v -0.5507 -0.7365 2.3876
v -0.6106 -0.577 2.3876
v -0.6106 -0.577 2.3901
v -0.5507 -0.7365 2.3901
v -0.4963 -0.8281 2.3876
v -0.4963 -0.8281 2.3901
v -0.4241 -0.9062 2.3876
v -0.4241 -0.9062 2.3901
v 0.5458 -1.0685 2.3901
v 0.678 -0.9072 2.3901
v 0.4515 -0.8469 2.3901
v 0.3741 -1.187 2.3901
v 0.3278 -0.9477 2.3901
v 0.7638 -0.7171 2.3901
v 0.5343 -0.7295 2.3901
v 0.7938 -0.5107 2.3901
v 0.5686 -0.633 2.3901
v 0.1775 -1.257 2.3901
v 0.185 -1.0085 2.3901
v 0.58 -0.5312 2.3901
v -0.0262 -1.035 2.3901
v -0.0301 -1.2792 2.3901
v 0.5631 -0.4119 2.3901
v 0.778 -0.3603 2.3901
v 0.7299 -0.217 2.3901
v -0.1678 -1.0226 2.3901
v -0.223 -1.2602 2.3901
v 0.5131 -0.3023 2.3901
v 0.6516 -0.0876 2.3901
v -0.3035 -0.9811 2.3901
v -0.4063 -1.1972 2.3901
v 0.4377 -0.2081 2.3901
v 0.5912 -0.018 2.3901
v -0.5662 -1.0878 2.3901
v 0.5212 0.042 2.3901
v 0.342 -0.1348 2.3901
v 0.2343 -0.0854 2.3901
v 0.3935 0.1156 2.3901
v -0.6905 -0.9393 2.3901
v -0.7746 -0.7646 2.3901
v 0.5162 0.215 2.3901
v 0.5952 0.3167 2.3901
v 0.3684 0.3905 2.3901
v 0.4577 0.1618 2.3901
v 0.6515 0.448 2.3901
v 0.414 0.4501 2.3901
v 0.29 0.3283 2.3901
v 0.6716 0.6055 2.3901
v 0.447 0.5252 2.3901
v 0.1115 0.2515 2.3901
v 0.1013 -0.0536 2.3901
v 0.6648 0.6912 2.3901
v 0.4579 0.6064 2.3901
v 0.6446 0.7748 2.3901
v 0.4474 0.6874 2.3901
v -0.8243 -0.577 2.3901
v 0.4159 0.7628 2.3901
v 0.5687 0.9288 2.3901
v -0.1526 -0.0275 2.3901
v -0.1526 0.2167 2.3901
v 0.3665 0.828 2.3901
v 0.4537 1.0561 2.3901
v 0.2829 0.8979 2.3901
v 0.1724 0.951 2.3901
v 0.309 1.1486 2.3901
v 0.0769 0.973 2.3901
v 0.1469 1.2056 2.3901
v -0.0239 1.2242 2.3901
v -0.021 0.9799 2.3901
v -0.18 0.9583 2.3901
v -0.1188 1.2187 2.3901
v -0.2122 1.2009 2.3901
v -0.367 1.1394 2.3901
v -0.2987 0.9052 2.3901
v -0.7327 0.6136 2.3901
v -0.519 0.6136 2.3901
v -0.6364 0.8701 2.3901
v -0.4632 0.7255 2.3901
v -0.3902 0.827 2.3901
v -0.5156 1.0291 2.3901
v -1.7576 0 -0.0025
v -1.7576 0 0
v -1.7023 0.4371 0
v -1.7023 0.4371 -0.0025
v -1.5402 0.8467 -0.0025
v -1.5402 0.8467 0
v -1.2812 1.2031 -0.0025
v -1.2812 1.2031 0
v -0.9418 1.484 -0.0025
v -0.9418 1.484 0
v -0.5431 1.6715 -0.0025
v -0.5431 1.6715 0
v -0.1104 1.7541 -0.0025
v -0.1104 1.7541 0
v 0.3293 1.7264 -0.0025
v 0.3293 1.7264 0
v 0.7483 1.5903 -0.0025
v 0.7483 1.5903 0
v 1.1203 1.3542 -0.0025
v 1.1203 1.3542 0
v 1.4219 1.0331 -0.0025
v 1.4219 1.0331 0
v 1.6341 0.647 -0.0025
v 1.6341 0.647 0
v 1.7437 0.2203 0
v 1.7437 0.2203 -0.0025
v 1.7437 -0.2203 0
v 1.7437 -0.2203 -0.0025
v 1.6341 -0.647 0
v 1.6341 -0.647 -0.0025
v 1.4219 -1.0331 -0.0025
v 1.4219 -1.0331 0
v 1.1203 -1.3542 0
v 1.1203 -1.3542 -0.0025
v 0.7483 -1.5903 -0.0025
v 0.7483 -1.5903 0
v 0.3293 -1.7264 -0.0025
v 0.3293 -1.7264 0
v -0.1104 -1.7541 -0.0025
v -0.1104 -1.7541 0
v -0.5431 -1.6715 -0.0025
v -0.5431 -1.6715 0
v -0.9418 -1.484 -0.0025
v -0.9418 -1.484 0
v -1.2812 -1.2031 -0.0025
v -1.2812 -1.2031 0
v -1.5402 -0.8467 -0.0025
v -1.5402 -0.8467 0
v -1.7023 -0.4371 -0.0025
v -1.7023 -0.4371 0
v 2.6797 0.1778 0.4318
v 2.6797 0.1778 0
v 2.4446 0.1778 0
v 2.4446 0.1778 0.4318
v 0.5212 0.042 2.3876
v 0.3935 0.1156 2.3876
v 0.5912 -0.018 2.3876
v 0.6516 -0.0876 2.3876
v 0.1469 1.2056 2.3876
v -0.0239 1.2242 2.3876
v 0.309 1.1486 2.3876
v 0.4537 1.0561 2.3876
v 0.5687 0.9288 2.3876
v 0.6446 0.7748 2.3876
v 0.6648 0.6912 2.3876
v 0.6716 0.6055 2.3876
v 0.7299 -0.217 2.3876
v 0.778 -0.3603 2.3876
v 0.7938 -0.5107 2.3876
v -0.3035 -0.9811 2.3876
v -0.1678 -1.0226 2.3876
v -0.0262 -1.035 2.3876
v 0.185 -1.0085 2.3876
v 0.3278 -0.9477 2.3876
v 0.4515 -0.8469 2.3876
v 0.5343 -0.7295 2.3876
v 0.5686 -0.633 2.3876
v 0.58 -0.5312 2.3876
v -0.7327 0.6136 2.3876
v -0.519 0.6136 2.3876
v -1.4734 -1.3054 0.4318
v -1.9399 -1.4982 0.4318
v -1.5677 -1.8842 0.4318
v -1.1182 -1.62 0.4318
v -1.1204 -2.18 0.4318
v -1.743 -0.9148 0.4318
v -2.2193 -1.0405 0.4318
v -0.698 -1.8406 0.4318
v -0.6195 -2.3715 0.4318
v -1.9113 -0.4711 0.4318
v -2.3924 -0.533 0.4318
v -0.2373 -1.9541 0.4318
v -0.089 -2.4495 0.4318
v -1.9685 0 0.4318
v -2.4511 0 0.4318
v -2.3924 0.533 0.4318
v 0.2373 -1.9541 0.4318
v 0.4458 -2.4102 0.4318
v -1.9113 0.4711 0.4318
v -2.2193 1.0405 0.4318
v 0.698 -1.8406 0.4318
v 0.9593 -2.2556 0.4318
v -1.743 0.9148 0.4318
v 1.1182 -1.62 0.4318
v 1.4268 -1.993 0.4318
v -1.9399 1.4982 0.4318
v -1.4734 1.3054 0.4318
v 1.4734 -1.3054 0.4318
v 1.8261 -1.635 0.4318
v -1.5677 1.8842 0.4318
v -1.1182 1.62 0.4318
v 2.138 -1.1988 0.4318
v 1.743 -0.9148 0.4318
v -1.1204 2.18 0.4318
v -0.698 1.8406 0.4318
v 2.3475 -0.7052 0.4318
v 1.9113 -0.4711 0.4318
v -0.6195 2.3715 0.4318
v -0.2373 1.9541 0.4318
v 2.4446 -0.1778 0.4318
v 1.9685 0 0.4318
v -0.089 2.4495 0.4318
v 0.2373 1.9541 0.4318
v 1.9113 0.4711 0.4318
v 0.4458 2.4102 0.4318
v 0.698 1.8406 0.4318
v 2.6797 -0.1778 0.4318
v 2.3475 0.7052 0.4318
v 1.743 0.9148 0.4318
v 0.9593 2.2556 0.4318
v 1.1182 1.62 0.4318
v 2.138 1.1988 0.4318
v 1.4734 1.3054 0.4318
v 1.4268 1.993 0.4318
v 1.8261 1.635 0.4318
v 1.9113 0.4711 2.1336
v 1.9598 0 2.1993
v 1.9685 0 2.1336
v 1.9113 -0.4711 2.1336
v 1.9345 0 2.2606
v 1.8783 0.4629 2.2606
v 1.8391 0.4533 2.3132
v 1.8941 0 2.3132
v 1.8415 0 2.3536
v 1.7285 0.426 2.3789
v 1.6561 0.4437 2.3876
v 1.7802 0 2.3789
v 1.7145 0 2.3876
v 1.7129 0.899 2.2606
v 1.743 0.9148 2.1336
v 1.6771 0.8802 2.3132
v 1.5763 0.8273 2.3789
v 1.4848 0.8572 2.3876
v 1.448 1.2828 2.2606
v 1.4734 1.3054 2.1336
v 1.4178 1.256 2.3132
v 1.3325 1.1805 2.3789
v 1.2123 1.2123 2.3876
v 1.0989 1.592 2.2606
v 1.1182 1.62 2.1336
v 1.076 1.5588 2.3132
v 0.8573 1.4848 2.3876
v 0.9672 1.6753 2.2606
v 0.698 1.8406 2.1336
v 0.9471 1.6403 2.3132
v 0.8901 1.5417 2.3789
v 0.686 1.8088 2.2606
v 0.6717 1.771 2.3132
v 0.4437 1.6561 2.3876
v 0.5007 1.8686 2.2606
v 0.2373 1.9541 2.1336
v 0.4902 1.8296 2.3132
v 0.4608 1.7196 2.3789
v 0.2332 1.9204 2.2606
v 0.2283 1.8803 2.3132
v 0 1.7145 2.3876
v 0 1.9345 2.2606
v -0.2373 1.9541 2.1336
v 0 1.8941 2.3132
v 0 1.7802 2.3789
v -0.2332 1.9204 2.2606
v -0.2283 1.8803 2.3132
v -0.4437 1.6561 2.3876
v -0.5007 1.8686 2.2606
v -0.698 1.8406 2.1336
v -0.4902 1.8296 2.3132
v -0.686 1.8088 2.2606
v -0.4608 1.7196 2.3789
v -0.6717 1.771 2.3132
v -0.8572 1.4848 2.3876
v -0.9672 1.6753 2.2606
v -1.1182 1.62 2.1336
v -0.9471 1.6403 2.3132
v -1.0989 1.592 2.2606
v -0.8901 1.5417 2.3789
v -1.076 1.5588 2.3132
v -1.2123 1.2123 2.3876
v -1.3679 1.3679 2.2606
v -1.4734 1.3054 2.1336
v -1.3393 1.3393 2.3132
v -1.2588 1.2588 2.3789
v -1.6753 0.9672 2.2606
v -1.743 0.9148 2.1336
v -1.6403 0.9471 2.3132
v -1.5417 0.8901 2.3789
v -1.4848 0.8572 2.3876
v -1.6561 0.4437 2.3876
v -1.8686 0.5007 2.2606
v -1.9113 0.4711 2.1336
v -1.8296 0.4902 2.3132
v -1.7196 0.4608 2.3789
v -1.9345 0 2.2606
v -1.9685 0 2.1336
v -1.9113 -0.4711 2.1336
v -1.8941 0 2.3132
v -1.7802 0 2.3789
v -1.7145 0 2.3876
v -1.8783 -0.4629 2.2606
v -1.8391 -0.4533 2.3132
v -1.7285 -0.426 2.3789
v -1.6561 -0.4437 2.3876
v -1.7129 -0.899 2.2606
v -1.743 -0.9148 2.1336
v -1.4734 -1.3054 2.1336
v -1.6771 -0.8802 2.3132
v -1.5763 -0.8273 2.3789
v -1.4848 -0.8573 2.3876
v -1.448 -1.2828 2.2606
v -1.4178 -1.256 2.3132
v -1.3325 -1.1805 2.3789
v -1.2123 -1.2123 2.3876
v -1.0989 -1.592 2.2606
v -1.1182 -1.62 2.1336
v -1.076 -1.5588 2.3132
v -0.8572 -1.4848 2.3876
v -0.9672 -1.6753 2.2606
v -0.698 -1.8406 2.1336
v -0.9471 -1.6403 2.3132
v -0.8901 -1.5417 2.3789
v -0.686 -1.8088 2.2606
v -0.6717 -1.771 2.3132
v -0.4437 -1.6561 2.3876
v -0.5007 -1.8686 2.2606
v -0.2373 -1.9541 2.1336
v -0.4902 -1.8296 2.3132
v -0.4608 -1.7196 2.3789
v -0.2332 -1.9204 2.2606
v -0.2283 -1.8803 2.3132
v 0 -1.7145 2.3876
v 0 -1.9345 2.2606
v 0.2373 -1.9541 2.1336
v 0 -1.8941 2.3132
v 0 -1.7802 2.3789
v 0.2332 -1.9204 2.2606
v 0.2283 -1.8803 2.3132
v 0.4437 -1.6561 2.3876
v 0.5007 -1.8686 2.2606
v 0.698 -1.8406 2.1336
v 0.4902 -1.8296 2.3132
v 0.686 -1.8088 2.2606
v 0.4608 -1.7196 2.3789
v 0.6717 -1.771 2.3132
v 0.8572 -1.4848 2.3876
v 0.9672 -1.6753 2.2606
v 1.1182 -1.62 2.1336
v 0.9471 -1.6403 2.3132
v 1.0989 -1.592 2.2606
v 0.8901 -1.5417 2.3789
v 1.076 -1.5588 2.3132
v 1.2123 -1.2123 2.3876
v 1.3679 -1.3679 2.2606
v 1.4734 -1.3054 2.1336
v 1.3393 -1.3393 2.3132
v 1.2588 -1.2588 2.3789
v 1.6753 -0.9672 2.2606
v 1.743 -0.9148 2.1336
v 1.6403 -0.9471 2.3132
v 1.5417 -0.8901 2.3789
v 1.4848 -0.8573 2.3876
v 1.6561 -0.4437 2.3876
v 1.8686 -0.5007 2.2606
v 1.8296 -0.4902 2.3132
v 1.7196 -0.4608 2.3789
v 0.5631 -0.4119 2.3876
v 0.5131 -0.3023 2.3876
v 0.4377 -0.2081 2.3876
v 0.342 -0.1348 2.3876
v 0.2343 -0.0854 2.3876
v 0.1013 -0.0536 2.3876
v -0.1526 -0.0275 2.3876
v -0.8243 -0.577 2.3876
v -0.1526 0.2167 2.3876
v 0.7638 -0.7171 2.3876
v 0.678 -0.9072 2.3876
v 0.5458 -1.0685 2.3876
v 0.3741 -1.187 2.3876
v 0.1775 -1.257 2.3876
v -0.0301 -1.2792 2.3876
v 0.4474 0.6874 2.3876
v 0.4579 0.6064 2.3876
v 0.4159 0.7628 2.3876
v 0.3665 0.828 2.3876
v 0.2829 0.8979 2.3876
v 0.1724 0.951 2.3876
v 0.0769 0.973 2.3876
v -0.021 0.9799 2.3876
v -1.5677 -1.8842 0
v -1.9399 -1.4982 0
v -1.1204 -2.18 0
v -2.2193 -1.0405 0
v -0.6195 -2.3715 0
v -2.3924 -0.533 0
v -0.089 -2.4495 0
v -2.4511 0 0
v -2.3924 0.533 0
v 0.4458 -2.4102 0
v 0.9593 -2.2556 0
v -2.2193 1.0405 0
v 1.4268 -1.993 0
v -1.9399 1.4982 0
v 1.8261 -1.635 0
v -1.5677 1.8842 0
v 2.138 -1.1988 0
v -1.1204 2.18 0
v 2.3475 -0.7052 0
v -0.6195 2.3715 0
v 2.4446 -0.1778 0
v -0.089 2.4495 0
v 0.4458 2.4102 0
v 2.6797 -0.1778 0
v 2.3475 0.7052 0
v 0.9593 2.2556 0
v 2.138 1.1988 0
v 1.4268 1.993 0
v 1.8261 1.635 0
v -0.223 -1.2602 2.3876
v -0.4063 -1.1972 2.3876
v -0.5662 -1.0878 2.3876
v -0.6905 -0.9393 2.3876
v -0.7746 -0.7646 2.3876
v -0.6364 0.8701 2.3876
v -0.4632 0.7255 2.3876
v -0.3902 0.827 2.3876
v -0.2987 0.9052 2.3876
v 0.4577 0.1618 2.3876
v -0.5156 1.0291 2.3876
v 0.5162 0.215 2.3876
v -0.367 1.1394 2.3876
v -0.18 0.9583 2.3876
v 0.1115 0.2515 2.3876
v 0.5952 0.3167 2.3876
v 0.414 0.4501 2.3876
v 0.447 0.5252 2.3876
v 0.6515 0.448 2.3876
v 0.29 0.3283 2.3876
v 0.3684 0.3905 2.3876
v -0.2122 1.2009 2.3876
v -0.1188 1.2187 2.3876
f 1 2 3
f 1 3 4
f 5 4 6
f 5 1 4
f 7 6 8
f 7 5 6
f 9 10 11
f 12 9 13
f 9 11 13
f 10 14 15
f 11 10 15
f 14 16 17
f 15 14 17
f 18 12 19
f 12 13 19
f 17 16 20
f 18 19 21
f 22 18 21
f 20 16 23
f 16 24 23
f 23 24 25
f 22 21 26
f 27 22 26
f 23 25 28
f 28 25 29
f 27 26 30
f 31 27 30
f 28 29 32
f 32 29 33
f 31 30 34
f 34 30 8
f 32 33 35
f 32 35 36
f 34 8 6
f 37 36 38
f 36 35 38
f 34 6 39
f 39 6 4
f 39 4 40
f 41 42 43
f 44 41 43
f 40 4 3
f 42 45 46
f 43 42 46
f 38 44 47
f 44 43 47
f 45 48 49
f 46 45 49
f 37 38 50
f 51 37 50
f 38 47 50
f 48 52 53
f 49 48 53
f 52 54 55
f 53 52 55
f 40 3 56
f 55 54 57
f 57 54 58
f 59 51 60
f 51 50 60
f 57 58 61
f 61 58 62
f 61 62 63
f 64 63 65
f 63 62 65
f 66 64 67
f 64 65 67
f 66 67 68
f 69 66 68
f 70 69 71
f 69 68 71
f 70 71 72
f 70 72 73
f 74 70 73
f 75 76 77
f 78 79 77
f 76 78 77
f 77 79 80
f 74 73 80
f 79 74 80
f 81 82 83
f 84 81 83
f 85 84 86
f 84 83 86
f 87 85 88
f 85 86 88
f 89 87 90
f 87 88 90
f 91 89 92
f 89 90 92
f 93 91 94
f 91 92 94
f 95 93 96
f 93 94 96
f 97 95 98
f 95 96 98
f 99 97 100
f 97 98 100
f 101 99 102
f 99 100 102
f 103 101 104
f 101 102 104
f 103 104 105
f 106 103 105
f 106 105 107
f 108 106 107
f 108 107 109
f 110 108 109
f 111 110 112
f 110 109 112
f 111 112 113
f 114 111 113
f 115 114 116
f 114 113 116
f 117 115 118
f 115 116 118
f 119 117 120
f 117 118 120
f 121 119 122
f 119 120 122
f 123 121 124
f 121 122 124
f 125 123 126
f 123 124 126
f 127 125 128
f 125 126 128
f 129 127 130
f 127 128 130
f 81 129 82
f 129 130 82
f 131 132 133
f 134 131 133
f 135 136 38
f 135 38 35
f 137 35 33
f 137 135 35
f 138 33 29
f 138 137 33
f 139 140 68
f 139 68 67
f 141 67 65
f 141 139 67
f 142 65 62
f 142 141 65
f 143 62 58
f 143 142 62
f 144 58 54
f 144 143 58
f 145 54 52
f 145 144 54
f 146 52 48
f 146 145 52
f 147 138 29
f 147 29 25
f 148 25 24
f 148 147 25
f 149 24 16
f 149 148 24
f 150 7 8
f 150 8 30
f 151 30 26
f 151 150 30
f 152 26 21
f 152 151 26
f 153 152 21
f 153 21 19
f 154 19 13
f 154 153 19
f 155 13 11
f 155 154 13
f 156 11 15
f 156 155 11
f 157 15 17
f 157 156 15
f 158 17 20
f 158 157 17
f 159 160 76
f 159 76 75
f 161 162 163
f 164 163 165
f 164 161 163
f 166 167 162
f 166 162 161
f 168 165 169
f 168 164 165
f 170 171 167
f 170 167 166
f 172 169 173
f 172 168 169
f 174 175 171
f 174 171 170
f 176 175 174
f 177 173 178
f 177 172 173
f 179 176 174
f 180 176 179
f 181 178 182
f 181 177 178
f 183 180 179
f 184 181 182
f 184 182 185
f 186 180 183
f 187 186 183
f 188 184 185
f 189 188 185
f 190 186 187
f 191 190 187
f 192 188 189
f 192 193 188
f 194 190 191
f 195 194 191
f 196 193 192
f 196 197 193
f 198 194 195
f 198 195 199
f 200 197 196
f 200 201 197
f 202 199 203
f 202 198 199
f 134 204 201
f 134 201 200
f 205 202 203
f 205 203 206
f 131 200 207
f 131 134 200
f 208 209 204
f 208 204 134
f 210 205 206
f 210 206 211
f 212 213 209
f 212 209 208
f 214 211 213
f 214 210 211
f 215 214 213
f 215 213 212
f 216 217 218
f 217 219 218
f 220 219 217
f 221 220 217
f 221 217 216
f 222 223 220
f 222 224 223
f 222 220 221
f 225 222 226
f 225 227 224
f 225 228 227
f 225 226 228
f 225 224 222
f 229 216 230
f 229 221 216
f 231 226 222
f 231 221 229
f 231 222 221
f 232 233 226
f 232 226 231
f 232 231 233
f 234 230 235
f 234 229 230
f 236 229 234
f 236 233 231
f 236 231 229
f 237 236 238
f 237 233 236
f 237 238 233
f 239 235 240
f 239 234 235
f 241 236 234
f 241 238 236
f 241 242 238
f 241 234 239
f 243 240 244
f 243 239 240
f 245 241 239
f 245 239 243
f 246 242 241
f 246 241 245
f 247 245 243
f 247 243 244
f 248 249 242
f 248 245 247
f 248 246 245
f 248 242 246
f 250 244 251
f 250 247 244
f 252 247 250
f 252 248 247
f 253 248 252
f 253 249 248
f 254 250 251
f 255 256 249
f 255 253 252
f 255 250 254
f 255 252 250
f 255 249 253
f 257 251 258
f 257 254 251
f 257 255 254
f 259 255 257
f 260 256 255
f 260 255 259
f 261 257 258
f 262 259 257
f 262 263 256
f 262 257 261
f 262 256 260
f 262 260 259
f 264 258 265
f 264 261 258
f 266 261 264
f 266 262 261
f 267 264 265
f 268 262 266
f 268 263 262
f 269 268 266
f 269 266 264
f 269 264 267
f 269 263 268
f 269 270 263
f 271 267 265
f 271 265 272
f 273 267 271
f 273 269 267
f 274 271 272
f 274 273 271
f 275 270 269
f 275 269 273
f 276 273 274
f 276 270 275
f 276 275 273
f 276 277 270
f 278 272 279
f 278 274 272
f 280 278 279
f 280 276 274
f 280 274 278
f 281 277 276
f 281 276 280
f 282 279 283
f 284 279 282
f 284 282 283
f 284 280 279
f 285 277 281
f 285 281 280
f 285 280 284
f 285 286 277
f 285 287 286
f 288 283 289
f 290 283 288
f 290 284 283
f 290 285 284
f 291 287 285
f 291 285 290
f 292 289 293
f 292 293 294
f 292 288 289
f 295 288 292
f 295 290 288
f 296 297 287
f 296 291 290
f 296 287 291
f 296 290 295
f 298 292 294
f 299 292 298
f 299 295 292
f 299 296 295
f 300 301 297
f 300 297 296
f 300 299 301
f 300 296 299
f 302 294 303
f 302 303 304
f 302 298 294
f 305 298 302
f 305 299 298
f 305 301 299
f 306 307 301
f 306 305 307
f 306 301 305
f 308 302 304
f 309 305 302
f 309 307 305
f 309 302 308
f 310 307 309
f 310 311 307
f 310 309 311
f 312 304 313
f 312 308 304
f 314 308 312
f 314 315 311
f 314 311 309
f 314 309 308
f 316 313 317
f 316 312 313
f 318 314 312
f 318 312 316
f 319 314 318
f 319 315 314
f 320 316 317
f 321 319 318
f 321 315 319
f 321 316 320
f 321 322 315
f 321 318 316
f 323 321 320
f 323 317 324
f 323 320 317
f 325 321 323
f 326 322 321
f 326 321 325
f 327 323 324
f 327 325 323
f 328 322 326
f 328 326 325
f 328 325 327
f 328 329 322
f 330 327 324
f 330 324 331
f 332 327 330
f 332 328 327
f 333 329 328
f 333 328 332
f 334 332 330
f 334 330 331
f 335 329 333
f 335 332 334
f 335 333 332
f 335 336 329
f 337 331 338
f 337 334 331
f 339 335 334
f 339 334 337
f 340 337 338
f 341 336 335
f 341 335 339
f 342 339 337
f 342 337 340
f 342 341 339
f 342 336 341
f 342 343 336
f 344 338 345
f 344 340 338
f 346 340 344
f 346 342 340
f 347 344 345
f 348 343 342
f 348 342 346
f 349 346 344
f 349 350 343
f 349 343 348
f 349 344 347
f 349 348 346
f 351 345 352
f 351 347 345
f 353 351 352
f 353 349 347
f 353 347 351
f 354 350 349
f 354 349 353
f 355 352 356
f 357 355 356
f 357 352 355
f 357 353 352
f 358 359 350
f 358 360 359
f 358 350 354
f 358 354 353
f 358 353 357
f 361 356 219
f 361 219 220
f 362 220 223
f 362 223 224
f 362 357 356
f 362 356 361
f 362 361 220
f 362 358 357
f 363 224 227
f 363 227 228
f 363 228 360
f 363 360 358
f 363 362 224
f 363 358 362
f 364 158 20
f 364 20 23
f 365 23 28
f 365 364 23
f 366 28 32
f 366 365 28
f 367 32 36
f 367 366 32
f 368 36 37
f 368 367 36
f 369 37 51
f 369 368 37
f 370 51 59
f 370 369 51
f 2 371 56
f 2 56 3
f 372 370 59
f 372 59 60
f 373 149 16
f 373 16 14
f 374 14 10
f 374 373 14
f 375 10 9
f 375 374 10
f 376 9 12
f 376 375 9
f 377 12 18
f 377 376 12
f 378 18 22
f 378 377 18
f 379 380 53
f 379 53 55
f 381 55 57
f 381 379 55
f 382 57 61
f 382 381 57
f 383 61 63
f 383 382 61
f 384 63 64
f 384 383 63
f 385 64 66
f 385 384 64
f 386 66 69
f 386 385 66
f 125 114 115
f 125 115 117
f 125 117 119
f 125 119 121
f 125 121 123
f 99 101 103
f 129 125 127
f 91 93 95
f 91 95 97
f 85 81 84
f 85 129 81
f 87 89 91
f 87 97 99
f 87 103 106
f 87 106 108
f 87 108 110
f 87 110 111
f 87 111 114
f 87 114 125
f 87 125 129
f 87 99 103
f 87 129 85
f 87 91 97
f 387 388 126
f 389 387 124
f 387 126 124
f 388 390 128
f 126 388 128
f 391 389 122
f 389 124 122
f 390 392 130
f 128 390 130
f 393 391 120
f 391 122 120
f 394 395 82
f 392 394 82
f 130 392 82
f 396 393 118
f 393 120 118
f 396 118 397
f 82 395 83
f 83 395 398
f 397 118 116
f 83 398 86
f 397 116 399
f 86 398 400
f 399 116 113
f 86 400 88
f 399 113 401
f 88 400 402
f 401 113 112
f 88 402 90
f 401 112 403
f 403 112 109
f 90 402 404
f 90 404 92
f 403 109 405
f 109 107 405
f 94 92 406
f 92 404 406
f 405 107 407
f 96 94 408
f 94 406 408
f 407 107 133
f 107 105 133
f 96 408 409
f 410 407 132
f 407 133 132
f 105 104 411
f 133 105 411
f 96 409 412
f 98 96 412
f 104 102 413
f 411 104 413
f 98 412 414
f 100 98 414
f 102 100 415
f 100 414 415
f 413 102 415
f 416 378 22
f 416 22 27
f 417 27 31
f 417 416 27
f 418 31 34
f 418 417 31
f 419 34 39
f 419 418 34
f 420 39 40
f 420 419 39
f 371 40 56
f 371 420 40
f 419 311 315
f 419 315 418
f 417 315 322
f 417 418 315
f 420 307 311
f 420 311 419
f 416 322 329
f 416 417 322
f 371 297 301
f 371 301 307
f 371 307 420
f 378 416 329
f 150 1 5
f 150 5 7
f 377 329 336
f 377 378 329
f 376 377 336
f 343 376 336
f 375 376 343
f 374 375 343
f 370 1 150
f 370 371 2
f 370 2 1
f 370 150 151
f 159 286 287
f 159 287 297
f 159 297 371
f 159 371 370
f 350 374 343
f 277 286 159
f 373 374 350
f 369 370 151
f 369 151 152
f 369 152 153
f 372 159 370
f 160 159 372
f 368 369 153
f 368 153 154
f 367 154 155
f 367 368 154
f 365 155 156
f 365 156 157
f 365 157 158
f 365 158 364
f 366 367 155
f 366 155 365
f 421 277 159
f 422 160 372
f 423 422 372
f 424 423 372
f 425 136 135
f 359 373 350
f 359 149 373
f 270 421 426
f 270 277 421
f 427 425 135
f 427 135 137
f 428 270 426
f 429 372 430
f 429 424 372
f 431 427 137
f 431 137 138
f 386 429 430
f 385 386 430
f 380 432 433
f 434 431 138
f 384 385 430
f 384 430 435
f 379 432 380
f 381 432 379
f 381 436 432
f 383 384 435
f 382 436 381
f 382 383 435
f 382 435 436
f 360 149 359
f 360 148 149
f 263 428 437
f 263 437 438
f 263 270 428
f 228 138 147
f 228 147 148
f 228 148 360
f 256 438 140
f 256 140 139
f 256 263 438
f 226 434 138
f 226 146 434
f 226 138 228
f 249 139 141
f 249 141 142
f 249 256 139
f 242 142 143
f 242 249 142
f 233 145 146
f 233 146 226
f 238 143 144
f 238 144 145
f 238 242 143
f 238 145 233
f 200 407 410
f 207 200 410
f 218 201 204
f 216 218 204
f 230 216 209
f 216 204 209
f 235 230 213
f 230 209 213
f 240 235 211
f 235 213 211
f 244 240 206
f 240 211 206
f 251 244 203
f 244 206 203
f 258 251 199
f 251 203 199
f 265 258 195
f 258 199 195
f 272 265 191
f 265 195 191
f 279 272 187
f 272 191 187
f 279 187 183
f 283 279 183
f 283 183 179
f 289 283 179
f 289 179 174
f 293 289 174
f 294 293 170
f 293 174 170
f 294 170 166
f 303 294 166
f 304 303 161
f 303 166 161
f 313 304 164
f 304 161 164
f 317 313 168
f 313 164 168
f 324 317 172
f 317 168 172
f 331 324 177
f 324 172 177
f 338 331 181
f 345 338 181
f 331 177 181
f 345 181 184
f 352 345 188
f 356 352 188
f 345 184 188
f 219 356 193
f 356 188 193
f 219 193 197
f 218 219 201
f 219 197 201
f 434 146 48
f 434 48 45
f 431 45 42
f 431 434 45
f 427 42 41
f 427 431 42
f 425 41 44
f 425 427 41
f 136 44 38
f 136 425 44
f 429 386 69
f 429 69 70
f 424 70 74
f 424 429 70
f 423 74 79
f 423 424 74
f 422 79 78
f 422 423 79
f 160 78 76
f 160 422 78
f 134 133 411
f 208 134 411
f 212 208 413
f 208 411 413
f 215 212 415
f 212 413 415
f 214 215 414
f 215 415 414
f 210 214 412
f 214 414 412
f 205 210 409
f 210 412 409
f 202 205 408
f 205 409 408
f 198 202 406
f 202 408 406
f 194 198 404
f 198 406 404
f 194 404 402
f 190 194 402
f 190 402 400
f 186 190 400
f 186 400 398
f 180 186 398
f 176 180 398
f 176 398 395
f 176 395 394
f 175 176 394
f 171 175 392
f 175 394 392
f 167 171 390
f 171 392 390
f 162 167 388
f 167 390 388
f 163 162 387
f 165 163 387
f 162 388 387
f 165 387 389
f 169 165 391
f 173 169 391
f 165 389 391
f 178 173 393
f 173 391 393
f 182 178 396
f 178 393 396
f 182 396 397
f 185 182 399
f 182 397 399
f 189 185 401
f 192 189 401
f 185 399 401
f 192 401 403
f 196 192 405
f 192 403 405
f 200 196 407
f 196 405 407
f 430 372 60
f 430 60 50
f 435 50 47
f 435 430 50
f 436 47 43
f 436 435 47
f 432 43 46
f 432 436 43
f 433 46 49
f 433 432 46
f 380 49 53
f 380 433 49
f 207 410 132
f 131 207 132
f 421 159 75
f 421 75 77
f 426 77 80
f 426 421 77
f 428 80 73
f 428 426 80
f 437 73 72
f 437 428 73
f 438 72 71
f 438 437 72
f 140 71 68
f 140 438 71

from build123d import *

# Parameters (mm, degrees)
BOSS_EXTRUDE1_DEPTH = 0.4318
SKETCH2_R           = 1.9685
BOSS_EXTRUDE2_DEPTH = 1.9558
SKETCH3_R           = 1.757566481
BOSS_EXTRUDE3_DEPTH = 0.00254
FILLET1_R           = 0.254
BOSS_EXTRUDE6_DEPTH = 0.00254


with BuildPart() as part:
    # Sketch1 → Boss-Extrude1 (new body)
    with BuildSketch(Plane.XY):
        with BuildLine():
            Line((2.6797, 0.1778), (2.4511, 0.1778))
            Line((2.4511, 0.1778), (2.44464279, 0.1778))
            ThreePointArc((2.44464279, 0.1778), (-2.4511, 0), (2.44464279, -0.1778))
            Line((2.44464279, -0.1778), (2.4511, -0.1778))
            Line((2.4511, -0.1778), (2.6797, -0.1778))
            Line((2.6797, -0.1778), (2.6797, 0.1778))
        make_face()
    extrude(amount=BOSS_EXTRUDE1_DEPTH)

    # Sketch2 → Boss-Extrude2 (add)
    with BuildSketch(Plane.XY.offset(0.4318)):
        Circle(SKETCH2_R)
    extrude(amount=BOSS_EXTRUDE2_DEPTH)

    # Sketch3 → Boss-Extrude3 (add)
    with BuildSketch(Plane(origin=(0, 0, 0), x_dir=(-1, 0, 0), z_dir=(0, 0, -1))):
        Circle(SKETCH3_R)
    extrude(amount=BOSS_EXTRUDE3_DEPTH)

    # Fillet1
    fillet1_edges = [part.edges().sort_by_distance(p)[0] for p in [
        (-1.9685, 0, 2.3876),
    ]]
    fillet(fillet1_edges, radius=FILLET1_R)

    # Sketch4 → Boss-Extrude6 (add)
    with BuildSketch(Plane.XY.offset(2.3876)):
        with BuildLine():
            Line((-0.518990385, 0.613589562), (-0.732692308, 0.613589562))
            add(Edge.make_bspline(
                [(-0.732692308, 0.613589562), (-0.726902774, 0.637560234), (-0.715584709, 0.684420938), (-0.691977968, 0.751373021), (-0.666260974, 0.814730274), (-0.635380173, 0.873306352), (-0.601696538, 0.928278463), (-0.563104829, 0.978399778), (-0.521385518, 1.024945028), (-0.475240329, 1.066251713), (-0.426847436, 1.103656203), (-0.375524954, 1.135547983), (-0.32230545, 1.162982809), (-0.266820193, 1.185584431), (-0.208903994, 1.202610725), (-0.149080447, 1.214963837), (-0.08719278, 1.222986006), (-0.045182366, 1.223768936), (-0.023850661, 1.224166485)],
                knots=[0, 0, 0, 0, 7.3931e-05, 0.000144529, 0.000212742, 0.000278882, 0.000342945, 0.000405913, 0.000468387, 0.000530188, 0.000591439, 0.00065166, 0.000711181, 0.000770884, 0.000831103, 0.000892006, 0.000954012, 0.001017976, 0.001017976, 0.001017976, 0.001017976], degree=3))
            add(Edge.make_bspline(
                [(-0.023850661, 1.224166485), (0.007229919, 1.223228116), (0.068713121, 1.221371846), (0.159039408, 1.204421132), (0.246143369, 1.177597961), (0.329071589, 1.140536372), (0.406100559, 1.094825003), (0.474637143, 1.040420424), (0.533752362, 0.978372327), (0.583346572, 0.909838208), (0.622177956, 0.836594013), (0.650811721, 0.761210335), (0.668243614, 0.683865993), (0.670502779, 0.63164363), (0.671634615, 0.605480338)],
                knots=[0, 0, 0, 0, 9.3165e-05, 0.000184299, 0.000274676, 0.00036607, 0.000456139, 0.000542705, 0.000627729, 0.00071246, 0.000795685, 0.000875689, 0.000953816, 0.001032256, 0.001032256, 0.001032256, 0.001032256], degree=3))
            add(Edge.make_bspline(
                [(0.671634615, 0.605480338), (0.670842958, 0.5803025), (0.669293807, 0.53103338), (0.656139982, 0.459105005), (0.634003704, 0.39131313), (0.603340169, 0.327372375), (0.563647078, 0.267688154), (0.515564404, 0.212126182), (0.458752772, 0.160440022), (0.415700494, 0.130831238), (0.393535907, 0.115587759)],
                knots=[0, 0, 0, 0, 7.549e-05, 0.000147723, 0.00021847, 0.000288876, 0.000359789, 0.000432846, 0.000508829, 0.000589457, 0.000589457, 0.000589457, 0.000589457], degree=3))
            add(Edge.make_bspline(
                [(0.393535907, 0.115587759), (0.418866798, 0.103356182), (0.469054617, 0.079121889), (0.537464888, 0.031595026), (0.599566443, -0.023280096), (0.634199152, -0.06610358), (0.65160006, -0.087619873)],
                knots=[0, 0, 0, 0, 8.4271e-05, 0.000166965, 0.000249046, 0.000331932, 0.000331932, 0.000331932, 0.000331932], degree=3))
            add(Edge.make_bspline(
                [(0.65160006, -0.087619873), (0.663058188, -0.103307379), (0.685786808, -0.134425497), (0.713841698, -0.18445653), (0.739293256, -0.235042096), (0.759125816, -0.287538049), (0.774484108, -0.341335939), (0.785462372, -0.396528141), (0.792282368, -0.453159724), (0.793259056, -0.491472322), (0.79375, -0.5107306)],
                knots=[0, 0, 0, 0, 5.8227e-05, 0.0001155, 0.00017182, 0.000227986, 0.00028355, 0.000339493, 0.000396649, 0.000454416, 0.000454416, 0.000454416, 0.000454416], degree=3))
            add(Edge.make_bspline(
                [(0.79375, -0.5107306), (0.79252909, -0.544074714), (0.790093015, -0.610606024), (0.768318815, -0.708900432), (0.734564092, -0.804984212), (0.686628212, -0.896883343), (0.628207639, -0.982867138), (0.558704174, -1.059799413), (0.478907529, -1.125929178), (0.389912971, -1.181181136), (0.29349471, -1.225348508), (0.190369174, -1.256003661), (0.082022262, -1.275969422), (0.007722297, -1.278110417), (-0.030051833, -1.279198899)],
                knots=[0, 0, 0, 0, 9.9919e-05, 0.000199368, 0.000300604, 0.000404715, 0.000509373, 0.0006117, 0.000714673, 0.000819238, 0.000925117, 0.001031803, 0.001141284, 0.001254506, 0.001254506, 0.001254506, 0.001254506], degree=3))
            add(Edge.make_bspline(
                [(-0.030051833, -1.279198899), (-0.055510321, -1.278608204), (-0.105604137, -1.277445913), (-0.179248374, -1.269500293), (-0.24954403, -1.254988272), (-0.316586149, -1.235459773), (-0.38043429, -1.210700392), (-0.440893619, -1.179867492), (-0.4983361, -1.14359663), (-0.552219672, -1.101459672), (-0.602537912, -1.054323617), (-0.647953605, -1.001351684), (-0.689223928, -0.943523093), (-0.72524383, -0.880166156), (-0.757653971, -0.812099651), (-0.784311015, -0.738452012), (-0.807773518, -0.659881633), (-0.818682, -0.605128027), (-0.824278846, -0.577035438)],
                knots=[0, 0, 0, 0, 7.6376e-05, 0.000150282, 0.000221848, 0.000291435, 0.000359554, 0.000426967, 0.000494723, 0.000563043, 0.000631881, 0.000701213, 0.000772025, 0.000844681, 0.000919578, 0.000997909, 0.001079421, 0.00116531, 0.00116531, 0.00116531, 0.00116531], degree=3))
            Line((-0.824278846, -0.577035438), (-0.610576923, -0.577035438))
            add(Edge.make_bspline(
                [(-0.610576923, -0.577035438), (-0.605009362, -0.595370391), (-0.594179973, -0.631033469), (-0.575746174, -0.68235982), (-0.554744724, -0.729411995), (-0.532214998, -0.772535155), (-0.508553234, -0.812153986), (-0.482077186, -0.847220865), (-0.454747822, -0.879276029), (-0.434147047, -0.897335845), (-0.424064754, -0.90617456)],
                knots=[0, 0, 0, 0, 5.7482e-05, 0.000111807, 0.000163485, 0.000211918, 0.000257731, 0.000301712, 0.000343624, 0.000383798, 0.000383798, 0.000383798, 0.000383798], degree=3))
            add(Edge.make_bspline(
                [(-0.424064754, -0.90617456), (-0.410732083, -0.916453623), (-0.384107896, -0.93698002), (-0.340722725, -0.963174878), (-0.29509465, -0.98587229), (-0.246235024, -1.003210304), (-0.195198189, -1.01789082), (-0.141159214, -1.027497816), (-0.084594853, -1.034089232), (-0.0459725, -1.034670891), (-0.026235727, -1.03496813)],
                knots=[0, 0, 0, 0, 5.0469e-05, 0.000100782, 0.000151769, 0.000203078, 0.000256087, 0.000310912, 0.00036754, 0.000426721, 0.000426721, 0.000426721, 0.000426721], degree=3))
            add(Edge.make_bspline(
                [(-0.026235727, -1.03496813), (-0.003951648, -1.034549094), (0.039622946, -1.033729707), (0.103205627, -1.02619427), (0.163694444, -1.015219828), (0.22041781, -0.998270103), (0.274118744, -0.97732813), (0.324044474, -0.951033412), (0.370850396, -0.920182806), (0.413937009, -0.885117772), (0.452680292, -0.846731005), (0.486793068, -0.80658104), (0.515793061, -0.764837163), (0.539186174, -0.72126837), (0.557658245, -0.676055081), (0.570233422, -0.629070413), (0.578977042, -0.58069888), (0.579689112, -0.547817921), (0.580048077, -0.531242168)],
                knots=[0, 0, 0, 0, 6.6824e-05, 0.000130669, 0.000191854, 0.000251023, 0.000307979, 0.000364521, 0.000419955, 0.000475904, 0.000530885, 0.00058335, 0.000633762, 0.000683063, 0.000731428, 0.000779917, 0.000828773, 0.00087844, 0.00087844, 0.00087844, 0.00087844], degree=3))
            add(Edge.make_bspline(
                [(0.580048077, -0.531242168), (0.579006925, -0.509054811), (0.576929803, -0.464790498), (0.561071644, -0.399668362), (0.534987524, -0.336923505), (0.498471048, -0.277626441), (0.454019418, -0.222669979), (0.402064008, -0.173635631), (0.342173374, -0.13317473), (0.287050928, -0.105219769), (0.238224991, -0.086144545), (0.196440595, -0.073438899), (0.149661549, -0.062679966), (0.098453551, -0.052670367), (0.042430756, -0.044151378), (-0.018345846, -0.037047214), (-0.083888569, -0.031362802), (-0.129262381, -0.028824325), (-0.152644231, -0.027516207)],
                knots=[0, 0, 0, 0, 6.6512e-05, 0.000132693, 0.000199842, 0.000269625, 0.000340845, 0.00041138, 0.000483093, 0.000556905, 0.000596324, 0.000640233, 0.000687786, 0.000740268, 0.000796736, 0.000857737, 0.000923814, 0.000994066, 0.000994066, 0.000994066, 0.000994066], degree=3))
            Line((-0.152644231, -0.027516207), (-0.152644231, 0.216714562))
            add(Edge.make_bspline(
                [(-0.152644231, 0.216714562), (-0.123183973, 0.217214491), (-0.065478566, 0.218193729), (0.018813809, 0.230037394), (0.099417973, 0.246420821), (0.174547596, 0.271515925), (0.243024667, 0.300662627), (0.302433182, 0.334579934), (0.35194083, 0.372281754), (0.391307024, 0.414350012), (0.420922445, 0.459467928), (0.442576034, 0.50649194), (0.45536697, 0.555834202), (0.45707444, 0.589508253), (0.457932692, 0.606434364)],
                knots=[0, 0, 0, 0, 8.8311e-05, 0.000172979, 0.000254936, 0.000334734, 0.000410148, 0.000477894, 0.000539436, 0.000596138, 0.000649853, 0.000700661, 0.000750872, 0.000801617, 0.000801617, 0.000801617, 0.000801617], degree=3))
            add(Edge.make_bspline(
                [(0.457932692, 0.606434364), (0.457650745, 0.618869758), (0.457089824, 0.643609386), (0.450015962, 0.679753406), (0.439386034, 0.714792442), (0.424772146, 0.748577488), (0.405211743, 0.780874228), (0.381803385, 0.81195801), (0.353930445, 0.841651367), (0.321990775, 0.869328513), (0.287692743, 0.895705441), (0.250103164, 0.918098469), (0.210355424, 0.937247163), (0.168405518, 0.953037913), (0.124117309, 0.964916465), (0.077698883, 0.973445314), (0.029061727, 0.978777718), (-0.004120469, 0.979545444), (-0.020988582, 0.979935716)],
                knots=[0, 0, 0, 0, 3.7256e-05, 7.4119e-05, 0.000110031, 0.000146987, 0.000184209, 0.000223038, 0.000263537, 0.000306122, 0.000349721, 0.000393161, 0.000437111, 0.000481942, 0.000527419, 0.000574479, 0.000623416, 0.000674016, 0.000674016, 0.000674016, 0.000674016], degree=3))
            add(Edge.make_bspline(
                [(-0.020988582, 0.979935716), (-0.048101949, 0.978989093), (-0.101060661, 0.977140118), (-0.177406881, 0.960945568), (-0.248381285, 0.935106907), (-0.302632056, 0.904264264), (-0.342693236, 0.873817987), (-0.371320582, 0.847228006), (-0.399433286, 0.817678174), (-0.425181863, 0.783348458), (-0.451221836, 0.746563731), (-0.474928582, 0.705454048), (-0.497965266, 0.661091772), (-0.511846286, 0.629730278), (-0.518990385, 0.613589562)],
                knots=[0, 0, 0, 0, 8.1262e-05, 0.000158723, 0.000232978, 0.000307113, 0.000344894, 0.00038372, 0.000424218, 0.000467059, 0.000512313, 0.000559354, 0.000609276, 0.000662216, 0.000662216, 0.000662216, 0.000662216], degree=3))
        make_face()
    extrude(amount=BOSS_EXTRUDE6_DEPTH)


solid = part.part
